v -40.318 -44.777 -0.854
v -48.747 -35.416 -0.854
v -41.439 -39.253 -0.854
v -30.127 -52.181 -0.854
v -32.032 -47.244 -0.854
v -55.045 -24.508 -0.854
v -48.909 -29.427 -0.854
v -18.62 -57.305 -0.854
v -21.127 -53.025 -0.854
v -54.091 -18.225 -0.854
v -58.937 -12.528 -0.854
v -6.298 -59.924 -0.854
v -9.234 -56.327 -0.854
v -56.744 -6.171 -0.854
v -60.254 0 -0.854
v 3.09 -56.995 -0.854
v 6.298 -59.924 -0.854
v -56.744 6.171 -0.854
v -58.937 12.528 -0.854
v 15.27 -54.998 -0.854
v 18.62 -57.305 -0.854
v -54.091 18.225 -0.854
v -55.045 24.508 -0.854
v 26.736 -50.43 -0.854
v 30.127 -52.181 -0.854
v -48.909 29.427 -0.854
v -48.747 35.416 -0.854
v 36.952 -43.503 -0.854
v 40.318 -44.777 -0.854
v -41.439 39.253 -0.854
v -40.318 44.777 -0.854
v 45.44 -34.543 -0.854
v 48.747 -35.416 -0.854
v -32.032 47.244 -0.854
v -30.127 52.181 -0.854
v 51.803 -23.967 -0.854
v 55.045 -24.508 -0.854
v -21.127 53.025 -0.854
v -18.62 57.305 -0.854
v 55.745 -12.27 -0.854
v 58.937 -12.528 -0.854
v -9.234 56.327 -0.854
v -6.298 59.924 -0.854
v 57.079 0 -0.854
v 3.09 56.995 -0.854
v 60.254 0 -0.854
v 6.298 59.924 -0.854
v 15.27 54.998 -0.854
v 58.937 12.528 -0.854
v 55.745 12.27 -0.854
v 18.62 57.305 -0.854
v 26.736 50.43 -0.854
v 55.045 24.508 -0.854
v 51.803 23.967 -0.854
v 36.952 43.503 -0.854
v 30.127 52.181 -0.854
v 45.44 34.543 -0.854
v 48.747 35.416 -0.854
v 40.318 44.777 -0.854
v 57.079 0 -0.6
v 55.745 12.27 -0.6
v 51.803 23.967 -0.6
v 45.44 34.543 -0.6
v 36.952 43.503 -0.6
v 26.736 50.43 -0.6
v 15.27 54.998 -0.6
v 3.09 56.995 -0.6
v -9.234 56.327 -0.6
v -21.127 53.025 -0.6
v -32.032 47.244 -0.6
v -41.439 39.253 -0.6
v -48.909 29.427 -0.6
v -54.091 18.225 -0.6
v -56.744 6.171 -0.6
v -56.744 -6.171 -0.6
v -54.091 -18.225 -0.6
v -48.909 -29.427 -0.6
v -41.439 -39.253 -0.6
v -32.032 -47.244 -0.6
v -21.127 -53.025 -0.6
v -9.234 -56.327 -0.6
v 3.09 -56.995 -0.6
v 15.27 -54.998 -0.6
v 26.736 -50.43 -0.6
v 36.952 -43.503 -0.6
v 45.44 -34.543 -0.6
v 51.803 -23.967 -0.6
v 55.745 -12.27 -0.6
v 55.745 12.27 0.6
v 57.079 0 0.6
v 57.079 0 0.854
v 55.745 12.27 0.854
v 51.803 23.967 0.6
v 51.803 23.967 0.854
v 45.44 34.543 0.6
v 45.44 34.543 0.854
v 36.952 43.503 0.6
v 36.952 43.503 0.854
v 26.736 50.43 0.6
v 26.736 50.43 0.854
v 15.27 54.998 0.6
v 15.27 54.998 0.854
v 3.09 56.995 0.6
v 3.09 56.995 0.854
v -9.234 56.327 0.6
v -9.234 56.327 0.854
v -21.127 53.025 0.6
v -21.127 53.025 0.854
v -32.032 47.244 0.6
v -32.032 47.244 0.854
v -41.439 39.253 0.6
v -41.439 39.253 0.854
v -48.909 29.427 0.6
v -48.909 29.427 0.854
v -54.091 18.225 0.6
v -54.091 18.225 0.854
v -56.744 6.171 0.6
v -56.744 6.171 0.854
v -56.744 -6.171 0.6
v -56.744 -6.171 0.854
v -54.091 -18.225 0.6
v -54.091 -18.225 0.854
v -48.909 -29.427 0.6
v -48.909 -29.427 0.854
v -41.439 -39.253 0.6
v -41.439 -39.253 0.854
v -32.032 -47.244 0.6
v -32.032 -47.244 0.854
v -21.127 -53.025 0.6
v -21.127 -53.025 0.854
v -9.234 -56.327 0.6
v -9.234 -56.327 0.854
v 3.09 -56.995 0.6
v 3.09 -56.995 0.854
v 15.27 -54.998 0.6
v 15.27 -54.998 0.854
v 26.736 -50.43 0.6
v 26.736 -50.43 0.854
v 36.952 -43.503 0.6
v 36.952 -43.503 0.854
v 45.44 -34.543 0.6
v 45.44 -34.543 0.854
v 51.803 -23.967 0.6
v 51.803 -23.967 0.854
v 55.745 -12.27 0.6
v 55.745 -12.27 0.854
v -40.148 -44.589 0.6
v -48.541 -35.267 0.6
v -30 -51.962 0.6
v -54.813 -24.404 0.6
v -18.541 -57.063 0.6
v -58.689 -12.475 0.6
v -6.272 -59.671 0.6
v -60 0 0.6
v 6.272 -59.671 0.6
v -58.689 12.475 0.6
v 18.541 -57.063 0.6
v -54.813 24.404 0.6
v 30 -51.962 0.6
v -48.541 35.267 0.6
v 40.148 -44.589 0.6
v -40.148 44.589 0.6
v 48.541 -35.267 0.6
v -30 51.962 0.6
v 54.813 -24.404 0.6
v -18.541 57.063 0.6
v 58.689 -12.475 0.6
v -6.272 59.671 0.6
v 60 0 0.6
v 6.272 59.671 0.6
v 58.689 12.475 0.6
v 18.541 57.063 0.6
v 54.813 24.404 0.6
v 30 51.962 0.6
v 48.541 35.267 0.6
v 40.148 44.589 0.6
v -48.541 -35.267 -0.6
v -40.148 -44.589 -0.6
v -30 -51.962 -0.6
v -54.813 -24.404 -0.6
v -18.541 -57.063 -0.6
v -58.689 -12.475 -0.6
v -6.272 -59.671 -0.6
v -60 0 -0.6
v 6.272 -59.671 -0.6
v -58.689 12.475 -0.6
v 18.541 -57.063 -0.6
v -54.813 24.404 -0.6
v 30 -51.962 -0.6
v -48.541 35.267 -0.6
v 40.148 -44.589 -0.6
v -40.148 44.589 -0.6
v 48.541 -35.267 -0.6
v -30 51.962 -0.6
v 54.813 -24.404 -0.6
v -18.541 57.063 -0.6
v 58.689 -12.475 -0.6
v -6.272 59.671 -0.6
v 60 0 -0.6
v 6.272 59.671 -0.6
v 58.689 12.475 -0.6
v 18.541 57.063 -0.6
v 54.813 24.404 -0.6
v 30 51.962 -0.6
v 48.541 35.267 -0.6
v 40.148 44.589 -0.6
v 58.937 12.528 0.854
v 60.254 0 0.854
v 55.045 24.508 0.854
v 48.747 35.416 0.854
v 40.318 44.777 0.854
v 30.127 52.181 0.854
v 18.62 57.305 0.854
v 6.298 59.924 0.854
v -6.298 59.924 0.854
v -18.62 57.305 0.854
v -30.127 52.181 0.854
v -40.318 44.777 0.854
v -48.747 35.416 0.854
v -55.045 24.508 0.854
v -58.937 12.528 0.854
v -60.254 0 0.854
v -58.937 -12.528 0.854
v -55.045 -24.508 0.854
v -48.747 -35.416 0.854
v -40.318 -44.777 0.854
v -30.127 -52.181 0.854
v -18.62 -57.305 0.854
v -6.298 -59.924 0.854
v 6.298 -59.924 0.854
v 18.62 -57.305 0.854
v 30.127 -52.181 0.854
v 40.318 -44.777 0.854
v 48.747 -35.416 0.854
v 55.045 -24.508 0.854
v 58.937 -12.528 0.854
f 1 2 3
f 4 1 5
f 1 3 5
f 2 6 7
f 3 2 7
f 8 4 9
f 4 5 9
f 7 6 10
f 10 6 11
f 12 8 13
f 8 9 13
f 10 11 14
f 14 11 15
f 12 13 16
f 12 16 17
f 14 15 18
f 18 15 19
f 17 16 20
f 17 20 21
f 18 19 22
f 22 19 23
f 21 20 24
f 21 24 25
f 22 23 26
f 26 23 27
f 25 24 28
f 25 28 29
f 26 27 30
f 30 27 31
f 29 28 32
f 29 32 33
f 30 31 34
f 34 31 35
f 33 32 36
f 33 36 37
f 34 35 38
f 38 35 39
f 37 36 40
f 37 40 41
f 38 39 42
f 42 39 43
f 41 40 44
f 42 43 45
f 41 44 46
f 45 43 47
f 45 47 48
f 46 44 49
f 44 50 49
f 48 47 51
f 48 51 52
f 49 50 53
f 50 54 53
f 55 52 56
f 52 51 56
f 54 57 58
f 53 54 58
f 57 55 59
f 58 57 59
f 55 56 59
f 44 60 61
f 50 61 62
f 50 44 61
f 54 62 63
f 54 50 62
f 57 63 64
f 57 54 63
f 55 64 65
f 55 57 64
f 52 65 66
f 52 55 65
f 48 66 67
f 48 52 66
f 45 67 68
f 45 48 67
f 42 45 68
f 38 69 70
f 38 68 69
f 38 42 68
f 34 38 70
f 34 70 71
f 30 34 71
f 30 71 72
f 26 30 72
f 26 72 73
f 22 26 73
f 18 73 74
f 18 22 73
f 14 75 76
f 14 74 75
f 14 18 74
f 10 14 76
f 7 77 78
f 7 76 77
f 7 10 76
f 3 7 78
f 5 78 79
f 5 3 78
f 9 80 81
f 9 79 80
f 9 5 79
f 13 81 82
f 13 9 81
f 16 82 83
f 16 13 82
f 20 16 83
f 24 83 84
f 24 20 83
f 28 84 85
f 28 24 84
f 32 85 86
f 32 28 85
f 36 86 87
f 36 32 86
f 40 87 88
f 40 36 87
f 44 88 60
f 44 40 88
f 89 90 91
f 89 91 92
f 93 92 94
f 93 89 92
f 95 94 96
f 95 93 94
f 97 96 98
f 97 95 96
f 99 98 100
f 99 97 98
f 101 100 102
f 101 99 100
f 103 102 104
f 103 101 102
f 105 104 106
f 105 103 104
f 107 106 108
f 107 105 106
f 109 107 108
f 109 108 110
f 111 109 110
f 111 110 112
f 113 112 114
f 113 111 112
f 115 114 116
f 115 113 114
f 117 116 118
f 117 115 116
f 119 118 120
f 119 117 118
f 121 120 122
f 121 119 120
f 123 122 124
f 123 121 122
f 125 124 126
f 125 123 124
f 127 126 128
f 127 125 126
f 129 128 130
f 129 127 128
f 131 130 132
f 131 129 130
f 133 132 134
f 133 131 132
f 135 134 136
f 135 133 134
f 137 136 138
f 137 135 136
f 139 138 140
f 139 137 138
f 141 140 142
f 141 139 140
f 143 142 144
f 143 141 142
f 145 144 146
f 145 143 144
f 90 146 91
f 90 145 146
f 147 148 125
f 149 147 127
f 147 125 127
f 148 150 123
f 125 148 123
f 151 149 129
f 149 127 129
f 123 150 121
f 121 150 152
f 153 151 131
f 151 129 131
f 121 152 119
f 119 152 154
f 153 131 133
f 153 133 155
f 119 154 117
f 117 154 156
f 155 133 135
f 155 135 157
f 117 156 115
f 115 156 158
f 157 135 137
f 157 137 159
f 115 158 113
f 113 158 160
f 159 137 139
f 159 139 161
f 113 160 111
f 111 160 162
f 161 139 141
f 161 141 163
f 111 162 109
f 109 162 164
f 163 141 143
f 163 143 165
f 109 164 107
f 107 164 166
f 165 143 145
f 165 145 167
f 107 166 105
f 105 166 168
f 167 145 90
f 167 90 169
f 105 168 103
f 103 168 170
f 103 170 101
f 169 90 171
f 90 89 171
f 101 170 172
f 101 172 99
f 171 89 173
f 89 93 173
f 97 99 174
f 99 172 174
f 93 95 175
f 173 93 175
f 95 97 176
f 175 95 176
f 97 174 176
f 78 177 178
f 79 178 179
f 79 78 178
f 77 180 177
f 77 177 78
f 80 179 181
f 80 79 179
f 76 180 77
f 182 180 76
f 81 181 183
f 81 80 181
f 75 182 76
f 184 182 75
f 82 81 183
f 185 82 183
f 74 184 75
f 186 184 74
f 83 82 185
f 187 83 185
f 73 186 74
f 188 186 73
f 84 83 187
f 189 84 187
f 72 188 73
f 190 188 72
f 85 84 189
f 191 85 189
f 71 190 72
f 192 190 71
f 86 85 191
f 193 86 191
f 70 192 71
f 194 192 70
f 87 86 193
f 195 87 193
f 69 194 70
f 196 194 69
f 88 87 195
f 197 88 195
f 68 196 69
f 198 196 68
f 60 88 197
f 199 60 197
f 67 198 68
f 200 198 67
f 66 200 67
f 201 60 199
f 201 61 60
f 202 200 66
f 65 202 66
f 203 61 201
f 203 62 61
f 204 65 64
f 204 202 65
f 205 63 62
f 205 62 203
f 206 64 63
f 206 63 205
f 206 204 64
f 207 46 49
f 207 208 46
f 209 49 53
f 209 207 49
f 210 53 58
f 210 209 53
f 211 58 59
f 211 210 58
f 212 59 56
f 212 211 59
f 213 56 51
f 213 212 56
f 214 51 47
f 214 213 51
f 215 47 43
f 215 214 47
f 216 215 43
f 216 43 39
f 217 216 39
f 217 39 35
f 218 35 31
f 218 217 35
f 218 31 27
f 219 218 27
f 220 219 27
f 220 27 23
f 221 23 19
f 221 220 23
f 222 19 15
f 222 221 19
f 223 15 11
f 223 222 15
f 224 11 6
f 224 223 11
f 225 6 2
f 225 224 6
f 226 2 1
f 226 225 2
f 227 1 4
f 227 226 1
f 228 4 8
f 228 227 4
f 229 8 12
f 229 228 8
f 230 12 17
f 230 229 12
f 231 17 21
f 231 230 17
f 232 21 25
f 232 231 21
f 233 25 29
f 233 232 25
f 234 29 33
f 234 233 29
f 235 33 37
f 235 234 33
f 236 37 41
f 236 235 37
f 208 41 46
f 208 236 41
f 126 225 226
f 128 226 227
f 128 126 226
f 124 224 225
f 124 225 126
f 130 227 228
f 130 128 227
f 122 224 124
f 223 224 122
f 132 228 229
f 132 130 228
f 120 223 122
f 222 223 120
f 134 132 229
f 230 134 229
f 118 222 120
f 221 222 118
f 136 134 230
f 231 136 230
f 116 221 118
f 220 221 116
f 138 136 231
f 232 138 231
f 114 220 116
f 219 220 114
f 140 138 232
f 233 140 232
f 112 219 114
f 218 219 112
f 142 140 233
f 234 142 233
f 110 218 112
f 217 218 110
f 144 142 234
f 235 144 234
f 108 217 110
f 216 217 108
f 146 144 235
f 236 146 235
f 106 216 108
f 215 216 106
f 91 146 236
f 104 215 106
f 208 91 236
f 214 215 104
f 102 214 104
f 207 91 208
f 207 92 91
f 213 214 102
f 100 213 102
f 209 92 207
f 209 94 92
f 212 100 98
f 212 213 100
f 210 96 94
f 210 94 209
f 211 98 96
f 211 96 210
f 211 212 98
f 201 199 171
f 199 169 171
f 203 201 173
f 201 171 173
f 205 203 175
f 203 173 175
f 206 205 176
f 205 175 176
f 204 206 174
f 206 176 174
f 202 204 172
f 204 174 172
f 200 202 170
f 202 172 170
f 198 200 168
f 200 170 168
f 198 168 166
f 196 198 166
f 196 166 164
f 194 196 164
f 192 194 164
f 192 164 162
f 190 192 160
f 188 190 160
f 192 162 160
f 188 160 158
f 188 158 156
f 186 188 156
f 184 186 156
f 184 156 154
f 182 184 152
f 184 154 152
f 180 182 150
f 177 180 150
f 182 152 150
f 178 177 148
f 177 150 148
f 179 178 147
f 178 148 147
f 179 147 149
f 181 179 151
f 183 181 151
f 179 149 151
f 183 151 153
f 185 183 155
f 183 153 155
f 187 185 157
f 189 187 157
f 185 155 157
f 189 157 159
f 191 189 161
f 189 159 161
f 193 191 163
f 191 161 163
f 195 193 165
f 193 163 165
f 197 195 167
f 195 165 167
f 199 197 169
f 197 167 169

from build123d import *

# Parameters (mm, degrees)
F0_R     = 60.254
F0_R_2   = 57.079
F1_DEPTH = 0.854
F2_R     = 60
F3_DEPTH = 0.6


with BuildPart() as f1:
    # F0 (on Top) → F1 (new body, symmetric)
    with BuildSketch(Plane.XY):
        Circle(F0_R)
        Circle(F0_R_2, mode=Mode.SUBTRACT)
    extrude(amount=F1_DEPTH, both=True)

    # F2 (on Top) → F3 (cut, symmetric)
    with BuildSketch(Plane.XY):
        Circle(F2_R)
    extrude(amount=F3_DEPTH, both=True, mode=Mode.SUBTRACT)


solid = f1.part
